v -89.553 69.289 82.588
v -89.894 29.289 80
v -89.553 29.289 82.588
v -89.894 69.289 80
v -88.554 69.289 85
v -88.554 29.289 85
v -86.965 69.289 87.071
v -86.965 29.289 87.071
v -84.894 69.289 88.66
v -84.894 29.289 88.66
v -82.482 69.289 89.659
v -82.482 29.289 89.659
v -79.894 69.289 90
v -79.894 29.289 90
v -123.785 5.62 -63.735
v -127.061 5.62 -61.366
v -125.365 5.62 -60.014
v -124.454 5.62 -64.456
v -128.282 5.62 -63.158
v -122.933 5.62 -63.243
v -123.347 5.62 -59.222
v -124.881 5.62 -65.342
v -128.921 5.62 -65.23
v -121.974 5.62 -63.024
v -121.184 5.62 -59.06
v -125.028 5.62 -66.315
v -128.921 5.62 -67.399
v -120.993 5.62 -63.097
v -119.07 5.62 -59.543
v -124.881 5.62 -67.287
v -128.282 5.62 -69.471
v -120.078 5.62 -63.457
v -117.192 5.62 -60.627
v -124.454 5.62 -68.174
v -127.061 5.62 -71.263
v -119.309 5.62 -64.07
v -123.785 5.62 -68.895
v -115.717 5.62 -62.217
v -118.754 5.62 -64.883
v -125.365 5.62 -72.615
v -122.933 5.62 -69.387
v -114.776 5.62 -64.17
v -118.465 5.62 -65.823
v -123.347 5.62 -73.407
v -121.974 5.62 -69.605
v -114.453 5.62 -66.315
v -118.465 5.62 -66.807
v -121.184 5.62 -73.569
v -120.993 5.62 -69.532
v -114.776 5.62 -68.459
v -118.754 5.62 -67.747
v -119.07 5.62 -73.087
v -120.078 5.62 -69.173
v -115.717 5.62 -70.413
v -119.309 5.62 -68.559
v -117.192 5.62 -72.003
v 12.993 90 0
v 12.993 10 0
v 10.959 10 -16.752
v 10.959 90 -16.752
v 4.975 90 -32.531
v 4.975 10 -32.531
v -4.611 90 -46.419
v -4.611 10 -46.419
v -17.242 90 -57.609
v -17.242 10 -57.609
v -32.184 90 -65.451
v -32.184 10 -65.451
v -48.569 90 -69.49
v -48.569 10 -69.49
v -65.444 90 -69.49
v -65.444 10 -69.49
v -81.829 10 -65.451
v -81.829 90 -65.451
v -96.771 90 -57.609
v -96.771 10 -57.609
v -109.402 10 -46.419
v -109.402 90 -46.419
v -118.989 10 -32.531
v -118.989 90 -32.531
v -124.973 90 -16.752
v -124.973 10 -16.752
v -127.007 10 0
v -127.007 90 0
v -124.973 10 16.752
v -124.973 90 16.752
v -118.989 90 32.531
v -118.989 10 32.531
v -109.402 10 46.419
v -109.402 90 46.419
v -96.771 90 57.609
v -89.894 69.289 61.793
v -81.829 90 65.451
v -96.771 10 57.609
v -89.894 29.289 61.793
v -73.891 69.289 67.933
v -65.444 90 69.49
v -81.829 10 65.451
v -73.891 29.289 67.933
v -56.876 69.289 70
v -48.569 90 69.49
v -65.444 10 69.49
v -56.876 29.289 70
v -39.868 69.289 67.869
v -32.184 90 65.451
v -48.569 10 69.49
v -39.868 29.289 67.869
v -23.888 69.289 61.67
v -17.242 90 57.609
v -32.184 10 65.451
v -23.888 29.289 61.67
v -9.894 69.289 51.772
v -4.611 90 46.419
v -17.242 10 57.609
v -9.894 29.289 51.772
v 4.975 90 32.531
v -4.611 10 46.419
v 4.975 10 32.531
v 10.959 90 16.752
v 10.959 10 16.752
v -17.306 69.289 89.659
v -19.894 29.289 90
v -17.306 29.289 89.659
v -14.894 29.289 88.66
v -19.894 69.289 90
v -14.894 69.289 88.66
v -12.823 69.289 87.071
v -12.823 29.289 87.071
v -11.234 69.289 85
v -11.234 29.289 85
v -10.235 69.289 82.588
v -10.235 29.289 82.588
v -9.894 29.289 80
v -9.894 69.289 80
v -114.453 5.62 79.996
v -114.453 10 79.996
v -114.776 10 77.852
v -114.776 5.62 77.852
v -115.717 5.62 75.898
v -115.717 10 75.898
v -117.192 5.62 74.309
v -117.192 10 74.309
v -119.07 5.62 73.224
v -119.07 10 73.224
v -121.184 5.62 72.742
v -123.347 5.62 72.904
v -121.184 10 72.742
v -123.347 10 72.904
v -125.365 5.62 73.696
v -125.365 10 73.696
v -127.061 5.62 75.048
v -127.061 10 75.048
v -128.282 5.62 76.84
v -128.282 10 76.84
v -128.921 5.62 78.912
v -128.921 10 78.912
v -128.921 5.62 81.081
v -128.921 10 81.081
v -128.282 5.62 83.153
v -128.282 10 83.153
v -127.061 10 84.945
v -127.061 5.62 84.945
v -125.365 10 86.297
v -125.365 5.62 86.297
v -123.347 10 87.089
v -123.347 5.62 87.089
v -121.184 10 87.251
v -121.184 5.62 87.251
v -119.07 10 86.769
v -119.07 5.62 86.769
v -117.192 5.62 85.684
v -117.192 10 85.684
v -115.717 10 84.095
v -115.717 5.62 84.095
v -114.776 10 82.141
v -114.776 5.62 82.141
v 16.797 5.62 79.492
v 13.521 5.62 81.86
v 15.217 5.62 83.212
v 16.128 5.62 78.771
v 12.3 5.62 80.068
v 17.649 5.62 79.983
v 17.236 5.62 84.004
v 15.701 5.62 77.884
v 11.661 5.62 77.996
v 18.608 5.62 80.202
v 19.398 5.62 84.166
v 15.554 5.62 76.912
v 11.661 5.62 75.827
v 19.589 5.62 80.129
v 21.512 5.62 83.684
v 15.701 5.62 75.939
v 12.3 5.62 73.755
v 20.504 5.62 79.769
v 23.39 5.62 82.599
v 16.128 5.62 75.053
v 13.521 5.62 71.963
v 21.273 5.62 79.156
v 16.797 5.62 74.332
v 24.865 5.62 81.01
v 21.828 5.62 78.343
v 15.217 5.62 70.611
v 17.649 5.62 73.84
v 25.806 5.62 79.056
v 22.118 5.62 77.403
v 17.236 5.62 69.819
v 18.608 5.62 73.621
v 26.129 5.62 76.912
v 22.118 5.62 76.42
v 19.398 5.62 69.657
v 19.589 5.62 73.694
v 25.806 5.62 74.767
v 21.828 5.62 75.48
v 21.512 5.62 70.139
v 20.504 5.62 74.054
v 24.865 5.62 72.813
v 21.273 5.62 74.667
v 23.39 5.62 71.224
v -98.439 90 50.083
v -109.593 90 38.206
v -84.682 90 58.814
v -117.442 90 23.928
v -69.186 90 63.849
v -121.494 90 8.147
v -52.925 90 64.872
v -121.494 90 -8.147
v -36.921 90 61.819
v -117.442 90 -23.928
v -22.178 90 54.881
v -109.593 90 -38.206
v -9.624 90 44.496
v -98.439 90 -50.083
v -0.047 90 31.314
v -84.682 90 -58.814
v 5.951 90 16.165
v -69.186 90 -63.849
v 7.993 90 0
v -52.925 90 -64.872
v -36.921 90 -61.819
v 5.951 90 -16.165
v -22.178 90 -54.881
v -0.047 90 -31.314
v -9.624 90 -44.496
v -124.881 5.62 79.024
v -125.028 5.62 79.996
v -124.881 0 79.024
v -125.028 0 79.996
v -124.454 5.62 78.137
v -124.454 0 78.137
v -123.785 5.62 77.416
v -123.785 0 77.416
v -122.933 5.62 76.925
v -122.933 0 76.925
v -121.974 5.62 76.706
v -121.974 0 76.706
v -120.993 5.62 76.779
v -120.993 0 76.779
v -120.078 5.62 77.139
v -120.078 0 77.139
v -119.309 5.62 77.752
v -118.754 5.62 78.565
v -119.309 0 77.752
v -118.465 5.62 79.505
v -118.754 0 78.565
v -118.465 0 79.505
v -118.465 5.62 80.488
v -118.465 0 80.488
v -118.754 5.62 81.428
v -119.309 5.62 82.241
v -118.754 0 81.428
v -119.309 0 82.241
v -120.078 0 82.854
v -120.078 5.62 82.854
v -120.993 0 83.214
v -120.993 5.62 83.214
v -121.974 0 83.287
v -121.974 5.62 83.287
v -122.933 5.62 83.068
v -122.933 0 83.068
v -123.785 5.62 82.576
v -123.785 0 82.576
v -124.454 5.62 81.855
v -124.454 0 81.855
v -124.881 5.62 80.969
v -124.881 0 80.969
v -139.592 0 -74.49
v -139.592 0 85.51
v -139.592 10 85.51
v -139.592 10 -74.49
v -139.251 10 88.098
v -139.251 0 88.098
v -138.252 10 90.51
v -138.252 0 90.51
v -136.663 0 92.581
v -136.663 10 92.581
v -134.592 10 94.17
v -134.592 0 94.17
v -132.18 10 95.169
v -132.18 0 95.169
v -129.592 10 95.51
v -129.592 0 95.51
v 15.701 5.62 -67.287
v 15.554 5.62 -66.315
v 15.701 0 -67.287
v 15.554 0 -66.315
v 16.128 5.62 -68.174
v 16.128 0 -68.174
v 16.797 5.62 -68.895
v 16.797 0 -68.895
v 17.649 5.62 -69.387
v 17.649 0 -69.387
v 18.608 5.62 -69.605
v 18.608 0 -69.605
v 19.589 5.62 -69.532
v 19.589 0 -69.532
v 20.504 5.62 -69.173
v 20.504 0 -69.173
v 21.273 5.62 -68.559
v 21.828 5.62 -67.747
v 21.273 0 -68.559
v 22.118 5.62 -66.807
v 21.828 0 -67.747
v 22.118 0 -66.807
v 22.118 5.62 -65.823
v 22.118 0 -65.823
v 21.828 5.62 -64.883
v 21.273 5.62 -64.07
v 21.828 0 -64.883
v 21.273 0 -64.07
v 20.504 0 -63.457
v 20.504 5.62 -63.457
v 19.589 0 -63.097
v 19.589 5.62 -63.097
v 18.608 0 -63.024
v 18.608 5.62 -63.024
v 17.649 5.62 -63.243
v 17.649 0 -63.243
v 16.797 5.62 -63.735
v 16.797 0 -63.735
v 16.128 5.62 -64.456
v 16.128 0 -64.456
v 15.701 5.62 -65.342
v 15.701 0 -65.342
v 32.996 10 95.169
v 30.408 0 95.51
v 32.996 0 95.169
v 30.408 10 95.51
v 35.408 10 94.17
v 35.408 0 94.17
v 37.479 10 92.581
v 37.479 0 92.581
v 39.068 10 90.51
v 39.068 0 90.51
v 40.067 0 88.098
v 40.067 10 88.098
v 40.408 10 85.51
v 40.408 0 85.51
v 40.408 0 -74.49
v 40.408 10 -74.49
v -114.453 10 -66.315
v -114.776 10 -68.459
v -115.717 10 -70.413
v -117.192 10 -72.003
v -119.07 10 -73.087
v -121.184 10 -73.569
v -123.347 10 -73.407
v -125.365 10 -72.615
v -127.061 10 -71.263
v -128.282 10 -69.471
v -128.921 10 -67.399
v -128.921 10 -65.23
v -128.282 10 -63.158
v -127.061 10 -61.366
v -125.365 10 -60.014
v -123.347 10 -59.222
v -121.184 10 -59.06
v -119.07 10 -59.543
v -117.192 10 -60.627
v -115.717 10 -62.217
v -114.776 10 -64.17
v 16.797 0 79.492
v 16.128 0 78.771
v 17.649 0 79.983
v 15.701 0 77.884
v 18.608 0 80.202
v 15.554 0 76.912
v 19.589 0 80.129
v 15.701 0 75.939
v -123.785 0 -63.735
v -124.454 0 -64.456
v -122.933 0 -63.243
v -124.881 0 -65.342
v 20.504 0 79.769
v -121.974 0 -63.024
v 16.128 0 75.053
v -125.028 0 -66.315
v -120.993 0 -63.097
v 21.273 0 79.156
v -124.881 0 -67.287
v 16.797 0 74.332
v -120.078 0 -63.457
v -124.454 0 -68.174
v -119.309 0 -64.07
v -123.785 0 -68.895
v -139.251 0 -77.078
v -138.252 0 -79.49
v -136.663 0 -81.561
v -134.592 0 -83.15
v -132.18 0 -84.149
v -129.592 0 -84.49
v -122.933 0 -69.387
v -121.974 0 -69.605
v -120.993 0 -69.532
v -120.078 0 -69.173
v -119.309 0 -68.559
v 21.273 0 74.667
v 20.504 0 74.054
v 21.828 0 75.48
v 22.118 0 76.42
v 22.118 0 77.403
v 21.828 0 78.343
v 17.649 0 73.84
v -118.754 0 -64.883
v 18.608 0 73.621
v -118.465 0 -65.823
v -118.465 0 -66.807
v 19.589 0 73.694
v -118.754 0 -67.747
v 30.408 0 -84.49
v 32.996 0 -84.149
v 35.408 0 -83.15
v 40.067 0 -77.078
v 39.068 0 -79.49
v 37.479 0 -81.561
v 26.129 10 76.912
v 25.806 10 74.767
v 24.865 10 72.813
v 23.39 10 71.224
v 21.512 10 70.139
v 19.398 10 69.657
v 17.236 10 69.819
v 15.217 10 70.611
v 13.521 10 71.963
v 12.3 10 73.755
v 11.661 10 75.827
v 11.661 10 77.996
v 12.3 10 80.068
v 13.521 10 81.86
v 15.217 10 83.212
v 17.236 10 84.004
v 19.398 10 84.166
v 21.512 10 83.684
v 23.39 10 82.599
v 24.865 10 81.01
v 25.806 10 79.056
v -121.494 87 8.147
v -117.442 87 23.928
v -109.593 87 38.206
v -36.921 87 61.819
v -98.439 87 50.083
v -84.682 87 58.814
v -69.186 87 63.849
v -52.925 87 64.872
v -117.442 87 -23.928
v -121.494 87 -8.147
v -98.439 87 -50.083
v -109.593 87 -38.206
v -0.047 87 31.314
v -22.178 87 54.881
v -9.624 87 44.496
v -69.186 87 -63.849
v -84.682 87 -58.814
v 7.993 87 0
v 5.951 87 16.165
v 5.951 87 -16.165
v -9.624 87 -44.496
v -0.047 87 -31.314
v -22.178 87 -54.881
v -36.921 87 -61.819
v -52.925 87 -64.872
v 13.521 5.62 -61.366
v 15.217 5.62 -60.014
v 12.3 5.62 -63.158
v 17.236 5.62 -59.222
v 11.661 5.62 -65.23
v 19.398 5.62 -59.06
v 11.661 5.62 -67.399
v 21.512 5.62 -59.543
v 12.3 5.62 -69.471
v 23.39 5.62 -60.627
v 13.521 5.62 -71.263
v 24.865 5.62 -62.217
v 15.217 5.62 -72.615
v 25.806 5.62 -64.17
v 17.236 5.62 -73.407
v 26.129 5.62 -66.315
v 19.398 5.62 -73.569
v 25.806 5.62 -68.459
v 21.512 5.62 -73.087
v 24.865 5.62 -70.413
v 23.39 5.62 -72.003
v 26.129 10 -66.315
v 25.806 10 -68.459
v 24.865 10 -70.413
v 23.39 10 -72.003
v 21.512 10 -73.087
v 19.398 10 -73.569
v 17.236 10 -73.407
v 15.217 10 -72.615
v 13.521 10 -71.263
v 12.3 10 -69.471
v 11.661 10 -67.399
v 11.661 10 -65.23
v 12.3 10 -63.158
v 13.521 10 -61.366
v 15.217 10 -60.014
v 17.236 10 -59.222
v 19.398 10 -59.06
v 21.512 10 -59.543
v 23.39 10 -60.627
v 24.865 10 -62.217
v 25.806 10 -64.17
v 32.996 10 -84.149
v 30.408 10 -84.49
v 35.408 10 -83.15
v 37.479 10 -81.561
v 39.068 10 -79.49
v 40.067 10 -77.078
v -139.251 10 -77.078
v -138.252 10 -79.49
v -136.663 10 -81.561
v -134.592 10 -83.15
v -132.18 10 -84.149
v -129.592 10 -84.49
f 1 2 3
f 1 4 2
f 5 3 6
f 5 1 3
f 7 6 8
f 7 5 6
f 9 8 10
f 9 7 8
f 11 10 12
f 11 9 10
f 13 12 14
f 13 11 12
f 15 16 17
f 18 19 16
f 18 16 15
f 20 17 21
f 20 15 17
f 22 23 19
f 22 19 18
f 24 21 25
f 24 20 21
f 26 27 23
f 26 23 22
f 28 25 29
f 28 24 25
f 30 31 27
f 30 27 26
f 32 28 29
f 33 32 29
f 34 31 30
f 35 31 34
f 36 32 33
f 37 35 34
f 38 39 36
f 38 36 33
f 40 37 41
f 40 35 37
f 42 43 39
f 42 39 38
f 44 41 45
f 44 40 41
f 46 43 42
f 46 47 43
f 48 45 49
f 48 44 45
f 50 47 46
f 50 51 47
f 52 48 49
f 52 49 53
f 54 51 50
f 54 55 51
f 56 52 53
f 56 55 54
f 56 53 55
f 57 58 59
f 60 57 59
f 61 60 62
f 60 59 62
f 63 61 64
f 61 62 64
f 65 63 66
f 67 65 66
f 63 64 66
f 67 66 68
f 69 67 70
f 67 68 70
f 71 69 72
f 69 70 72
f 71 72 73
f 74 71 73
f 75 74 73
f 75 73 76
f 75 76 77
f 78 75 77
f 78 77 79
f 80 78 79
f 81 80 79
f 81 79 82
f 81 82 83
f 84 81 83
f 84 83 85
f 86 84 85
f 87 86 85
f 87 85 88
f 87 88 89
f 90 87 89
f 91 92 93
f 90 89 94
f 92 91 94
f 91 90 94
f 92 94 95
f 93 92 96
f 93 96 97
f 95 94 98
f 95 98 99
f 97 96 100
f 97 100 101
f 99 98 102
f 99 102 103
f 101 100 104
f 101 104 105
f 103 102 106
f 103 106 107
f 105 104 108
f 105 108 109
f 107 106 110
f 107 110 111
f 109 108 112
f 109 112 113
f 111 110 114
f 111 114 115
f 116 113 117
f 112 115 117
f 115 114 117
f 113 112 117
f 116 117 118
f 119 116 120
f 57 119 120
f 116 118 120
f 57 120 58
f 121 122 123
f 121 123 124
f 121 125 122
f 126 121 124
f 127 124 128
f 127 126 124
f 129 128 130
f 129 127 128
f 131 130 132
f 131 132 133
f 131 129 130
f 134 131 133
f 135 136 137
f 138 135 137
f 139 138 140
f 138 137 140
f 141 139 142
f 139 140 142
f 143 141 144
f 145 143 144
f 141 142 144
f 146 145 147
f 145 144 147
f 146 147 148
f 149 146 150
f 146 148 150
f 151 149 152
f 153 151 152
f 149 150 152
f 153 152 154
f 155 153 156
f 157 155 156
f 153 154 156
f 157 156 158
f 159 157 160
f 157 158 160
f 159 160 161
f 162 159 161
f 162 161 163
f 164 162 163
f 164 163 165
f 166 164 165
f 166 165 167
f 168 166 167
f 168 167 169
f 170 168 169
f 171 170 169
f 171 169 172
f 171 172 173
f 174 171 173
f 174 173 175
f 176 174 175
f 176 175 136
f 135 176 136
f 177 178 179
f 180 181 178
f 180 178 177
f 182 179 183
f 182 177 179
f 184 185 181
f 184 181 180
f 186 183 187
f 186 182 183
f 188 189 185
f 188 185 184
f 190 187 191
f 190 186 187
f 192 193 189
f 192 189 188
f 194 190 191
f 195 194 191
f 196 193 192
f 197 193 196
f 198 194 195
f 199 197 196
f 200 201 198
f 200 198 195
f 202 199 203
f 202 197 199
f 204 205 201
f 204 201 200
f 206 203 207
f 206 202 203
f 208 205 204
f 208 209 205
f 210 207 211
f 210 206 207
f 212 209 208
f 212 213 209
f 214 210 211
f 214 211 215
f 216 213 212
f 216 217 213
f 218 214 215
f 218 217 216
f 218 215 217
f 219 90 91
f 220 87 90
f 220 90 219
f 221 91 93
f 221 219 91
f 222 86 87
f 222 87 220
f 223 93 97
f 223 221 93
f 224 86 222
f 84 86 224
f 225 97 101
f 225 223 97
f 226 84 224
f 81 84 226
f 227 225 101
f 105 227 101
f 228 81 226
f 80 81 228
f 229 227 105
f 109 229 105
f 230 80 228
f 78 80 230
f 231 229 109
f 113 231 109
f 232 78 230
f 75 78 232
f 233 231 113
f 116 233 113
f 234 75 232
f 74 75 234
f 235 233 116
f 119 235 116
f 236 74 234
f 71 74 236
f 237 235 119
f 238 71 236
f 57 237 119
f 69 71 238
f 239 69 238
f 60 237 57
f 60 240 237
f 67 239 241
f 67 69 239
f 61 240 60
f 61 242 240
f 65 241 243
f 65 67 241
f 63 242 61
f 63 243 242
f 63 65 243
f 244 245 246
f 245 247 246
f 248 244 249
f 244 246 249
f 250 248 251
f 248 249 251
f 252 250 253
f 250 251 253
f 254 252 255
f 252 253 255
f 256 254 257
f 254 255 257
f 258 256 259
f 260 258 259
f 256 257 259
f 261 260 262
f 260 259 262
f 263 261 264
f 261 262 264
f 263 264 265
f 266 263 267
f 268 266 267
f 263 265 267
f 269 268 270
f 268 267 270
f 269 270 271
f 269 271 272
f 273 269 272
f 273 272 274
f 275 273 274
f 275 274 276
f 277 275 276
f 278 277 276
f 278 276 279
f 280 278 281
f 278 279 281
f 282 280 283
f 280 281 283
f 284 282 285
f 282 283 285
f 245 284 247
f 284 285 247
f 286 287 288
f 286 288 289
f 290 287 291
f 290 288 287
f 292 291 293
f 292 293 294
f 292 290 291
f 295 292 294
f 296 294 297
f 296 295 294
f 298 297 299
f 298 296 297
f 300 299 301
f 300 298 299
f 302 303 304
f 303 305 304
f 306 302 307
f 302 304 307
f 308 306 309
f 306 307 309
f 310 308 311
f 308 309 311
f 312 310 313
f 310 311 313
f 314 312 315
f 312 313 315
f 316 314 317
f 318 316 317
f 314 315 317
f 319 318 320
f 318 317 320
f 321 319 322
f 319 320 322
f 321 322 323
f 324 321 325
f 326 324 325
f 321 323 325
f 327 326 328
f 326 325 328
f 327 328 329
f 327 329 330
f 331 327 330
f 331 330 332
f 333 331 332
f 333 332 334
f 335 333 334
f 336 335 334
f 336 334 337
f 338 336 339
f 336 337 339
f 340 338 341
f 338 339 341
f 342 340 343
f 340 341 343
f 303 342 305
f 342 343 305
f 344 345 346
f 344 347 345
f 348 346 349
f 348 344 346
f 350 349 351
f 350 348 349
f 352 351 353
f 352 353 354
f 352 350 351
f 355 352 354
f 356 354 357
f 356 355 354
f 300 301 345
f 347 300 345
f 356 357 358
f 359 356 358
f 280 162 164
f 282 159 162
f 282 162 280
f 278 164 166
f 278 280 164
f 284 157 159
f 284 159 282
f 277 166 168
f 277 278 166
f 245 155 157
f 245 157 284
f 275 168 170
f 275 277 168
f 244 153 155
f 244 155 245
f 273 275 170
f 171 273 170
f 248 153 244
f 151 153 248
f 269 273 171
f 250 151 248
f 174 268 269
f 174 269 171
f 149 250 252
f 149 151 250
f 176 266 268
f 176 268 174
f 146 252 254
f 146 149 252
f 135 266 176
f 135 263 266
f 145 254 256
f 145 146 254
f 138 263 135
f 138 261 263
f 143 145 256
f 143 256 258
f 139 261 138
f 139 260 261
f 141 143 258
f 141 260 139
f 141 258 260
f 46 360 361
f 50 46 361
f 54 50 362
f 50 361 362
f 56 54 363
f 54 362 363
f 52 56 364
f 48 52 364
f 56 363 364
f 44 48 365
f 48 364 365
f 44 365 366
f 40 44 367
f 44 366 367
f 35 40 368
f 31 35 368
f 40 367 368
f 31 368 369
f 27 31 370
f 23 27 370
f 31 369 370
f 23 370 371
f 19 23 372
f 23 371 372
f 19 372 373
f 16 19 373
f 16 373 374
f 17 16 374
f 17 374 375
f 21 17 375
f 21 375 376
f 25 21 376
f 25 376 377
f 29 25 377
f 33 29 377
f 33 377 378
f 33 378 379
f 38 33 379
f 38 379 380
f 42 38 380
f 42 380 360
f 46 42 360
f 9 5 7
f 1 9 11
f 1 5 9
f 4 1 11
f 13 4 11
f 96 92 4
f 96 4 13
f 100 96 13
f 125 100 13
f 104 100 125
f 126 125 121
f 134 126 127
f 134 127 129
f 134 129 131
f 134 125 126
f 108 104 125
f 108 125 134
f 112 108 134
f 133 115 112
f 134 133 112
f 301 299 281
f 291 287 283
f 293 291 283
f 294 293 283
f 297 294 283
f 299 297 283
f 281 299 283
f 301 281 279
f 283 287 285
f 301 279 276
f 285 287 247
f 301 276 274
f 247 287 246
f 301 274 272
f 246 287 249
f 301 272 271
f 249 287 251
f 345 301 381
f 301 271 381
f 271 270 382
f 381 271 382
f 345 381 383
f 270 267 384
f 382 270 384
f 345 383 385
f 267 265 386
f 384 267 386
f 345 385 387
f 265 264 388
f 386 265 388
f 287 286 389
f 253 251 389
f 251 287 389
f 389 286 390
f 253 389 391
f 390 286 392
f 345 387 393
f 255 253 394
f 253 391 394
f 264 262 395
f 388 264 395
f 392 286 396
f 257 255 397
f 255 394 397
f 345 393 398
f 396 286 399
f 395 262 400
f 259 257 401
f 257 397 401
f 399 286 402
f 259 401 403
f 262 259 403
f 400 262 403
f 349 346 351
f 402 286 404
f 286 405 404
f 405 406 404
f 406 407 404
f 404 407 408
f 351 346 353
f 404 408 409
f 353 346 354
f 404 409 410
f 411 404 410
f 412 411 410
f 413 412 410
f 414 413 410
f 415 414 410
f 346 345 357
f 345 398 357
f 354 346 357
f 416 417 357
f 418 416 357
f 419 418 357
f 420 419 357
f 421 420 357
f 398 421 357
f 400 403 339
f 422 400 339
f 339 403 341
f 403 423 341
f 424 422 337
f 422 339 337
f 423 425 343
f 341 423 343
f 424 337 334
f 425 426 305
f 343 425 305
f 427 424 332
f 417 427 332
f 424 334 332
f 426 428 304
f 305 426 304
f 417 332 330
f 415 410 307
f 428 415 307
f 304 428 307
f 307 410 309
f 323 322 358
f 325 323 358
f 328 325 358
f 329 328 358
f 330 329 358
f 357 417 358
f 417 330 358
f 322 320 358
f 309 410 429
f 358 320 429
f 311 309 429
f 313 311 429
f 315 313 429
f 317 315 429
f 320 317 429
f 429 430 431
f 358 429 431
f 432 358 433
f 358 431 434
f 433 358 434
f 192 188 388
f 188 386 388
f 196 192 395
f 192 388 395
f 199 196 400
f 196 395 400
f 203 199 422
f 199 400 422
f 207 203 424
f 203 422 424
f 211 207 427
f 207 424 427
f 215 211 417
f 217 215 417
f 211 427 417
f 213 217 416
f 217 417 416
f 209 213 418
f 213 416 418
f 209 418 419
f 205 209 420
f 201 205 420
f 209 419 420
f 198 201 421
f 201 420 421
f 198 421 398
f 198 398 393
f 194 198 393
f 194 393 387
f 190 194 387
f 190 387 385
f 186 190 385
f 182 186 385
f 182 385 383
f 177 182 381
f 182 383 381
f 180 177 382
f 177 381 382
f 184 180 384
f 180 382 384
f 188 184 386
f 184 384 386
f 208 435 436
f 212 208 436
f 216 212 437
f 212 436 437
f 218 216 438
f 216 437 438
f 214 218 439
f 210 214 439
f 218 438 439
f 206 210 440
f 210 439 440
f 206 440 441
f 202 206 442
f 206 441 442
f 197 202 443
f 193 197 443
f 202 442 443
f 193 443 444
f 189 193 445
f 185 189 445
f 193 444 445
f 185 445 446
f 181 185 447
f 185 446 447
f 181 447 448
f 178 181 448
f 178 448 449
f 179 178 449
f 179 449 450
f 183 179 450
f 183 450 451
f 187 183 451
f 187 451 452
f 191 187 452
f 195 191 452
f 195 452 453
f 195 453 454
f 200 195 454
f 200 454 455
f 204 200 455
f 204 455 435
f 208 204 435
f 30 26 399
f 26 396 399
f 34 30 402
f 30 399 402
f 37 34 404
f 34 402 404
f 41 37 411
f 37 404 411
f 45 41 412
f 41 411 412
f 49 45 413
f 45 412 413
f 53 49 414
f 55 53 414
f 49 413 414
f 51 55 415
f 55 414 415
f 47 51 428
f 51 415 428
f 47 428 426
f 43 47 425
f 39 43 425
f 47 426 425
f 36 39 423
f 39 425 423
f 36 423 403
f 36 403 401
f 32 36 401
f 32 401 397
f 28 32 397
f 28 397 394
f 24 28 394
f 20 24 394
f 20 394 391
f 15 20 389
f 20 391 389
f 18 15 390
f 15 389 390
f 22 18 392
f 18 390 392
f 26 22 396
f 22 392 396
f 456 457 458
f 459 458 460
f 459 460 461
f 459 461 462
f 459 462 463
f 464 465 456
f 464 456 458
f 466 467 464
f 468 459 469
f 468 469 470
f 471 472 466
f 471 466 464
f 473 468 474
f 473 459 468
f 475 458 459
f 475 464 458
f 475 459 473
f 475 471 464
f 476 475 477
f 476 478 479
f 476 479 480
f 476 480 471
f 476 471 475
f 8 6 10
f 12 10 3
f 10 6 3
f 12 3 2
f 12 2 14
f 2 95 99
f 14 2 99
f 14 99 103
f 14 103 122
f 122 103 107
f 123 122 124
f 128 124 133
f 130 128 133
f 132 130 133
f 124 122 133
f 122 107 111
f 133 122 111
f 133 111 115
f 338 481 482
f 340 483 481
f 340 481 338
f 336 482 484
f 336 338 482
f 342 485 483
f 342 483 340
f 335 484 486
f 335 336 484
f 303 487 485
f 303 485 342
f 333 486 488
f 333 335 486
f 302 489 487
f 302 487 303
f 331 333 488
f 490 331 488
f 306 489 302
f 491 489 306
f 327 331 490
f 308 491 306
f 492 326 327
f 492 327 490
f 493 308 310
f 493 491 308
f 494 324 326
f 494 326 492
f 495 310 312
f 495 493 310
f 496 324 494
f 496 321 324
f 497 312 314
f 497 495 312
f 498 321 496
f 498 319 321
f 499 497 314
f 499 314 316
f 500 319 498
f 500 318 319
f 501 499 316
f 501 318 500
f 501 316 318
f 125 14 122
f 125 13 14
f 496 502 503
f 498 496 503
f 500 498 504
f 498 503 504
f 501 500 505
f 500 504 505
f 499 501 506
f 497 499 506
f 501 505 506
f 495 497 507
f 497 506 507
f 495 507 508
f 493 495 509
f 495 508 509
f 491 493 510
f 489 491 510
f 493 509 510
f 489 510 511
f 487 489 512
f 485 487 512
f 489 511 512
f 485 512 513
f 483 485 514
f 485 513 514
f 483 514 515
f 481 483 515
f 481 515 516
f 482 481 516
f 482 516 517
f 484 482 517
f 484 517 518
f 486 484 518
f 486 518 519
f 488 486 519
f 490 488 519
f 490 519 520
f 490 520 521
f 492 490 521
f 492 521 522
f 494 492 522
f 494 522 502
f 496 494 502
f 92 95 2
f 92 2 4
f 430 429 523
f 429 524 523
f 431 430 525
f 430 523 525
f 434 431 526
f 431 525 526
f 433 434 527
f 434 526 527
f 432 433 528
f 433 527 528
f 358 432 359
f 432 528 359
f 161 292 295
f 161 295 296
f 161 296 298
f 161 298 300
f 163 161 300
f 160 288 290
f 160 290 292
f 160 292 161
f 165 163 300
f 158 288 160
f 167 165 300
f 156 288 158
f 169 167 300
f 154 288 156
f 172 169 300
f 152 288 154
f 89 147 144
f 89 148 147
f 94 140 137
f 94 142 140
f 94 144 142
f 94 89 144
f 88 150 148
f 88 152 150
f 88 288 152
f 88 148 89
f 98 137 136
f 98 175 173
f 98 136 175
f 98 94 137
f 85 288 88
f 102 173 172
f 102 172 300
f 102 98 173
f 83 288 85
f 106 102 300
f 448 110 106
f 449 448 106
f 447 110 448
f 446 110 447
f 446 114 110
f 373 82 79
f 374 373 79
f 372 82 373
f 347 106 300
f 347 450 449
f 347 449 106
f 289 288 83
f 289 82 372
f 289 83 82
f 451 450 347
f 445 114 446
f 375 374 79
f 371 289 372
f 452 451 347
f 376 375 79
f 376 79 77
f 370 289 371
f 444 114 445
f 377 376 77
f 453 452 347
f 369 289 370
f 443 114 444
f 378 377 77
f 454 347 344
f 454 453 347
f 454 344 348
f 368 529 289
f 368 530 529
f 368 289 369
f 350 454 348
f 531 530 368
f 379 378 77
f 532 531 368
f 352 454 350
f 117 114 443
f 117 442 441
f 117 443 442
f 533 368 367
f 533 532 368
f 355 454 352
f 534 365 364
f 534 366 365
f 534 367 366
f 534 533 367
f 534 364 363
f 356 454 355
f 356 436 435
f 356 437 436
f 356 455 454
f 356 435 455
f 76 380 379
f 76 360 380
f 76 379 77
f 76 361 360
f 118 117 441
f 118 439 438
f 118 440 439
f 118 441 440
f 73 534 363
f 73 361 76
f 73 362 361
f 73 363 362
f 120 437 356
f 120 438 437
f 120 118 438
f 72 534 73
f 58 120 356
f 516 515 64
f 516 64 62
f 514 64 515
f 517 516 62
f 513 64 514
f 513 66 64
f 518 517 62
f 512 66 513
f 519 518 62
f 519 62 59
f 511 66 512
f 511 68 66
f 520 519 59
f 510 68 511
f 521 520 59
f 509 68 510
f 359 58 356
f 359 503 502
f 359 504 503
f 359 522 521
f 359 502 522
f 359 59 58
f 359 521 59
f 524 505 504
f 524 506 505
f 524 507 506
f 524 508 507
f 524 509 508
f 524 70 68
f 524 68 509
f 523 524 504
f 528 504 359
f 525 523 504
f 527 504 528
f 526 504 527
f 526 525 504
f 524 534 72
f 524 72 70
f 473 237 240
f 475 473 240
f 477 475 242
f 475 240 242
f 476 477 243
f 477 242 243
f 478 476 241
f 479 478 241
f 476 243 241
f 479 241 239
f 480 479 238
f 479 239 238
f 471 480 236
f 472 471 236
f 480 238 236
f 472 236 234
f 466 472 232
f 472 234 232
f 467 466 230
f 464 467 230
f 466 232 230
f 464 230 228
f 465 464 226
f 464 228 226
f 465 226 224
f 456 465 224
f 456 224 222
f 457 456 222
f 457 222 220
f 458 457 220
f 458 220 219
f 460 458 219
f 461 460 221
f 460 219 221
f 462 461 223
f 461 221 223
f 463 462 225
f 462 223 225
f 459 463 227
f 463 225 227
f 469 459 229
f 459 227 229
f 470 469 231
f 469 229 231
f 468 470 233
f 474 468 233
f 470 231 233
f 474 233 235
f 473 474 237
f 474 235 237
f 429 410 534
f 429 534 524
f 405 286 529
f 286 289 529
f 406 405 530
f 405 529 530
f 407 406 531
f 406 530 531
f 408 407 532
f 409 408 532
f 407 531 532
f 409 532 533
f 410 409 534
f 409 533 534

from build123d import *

# Parameters (mm, degrees)
SKETCH1_W                               = 180
SKETCH1_H                               = 180
BOSS_EXTRUDE1_DEPTH                     = 10
SKETCH2_R                               = 70
BOSS_EXTRUDE2_DEPTH                     = 80
SKETCH3_W                               = 80
SKETCH3_H                               = 40
BOSS_EXTRUDE3_DEPTH                     = 90
SKETCH4_R                               = 65
CUT_EXTRUDE1_DEPTH                      = 3
CBORE_FOR_M6_HEX_HEAD_BOLT1_D           = 6.6
CBORE_FOR_M6_HEX_HEAD_BOLT1_CBORE_D     = 14.55
CBORE_FOR_M6_HEX_HEAD_BOLT1_CBORE_DEPTH = 4.38
FILLET1_R                               = 10


with BuildPart() as part:
    # Sketch1 → Boss-Extrude1 (new body)
    with BuildSketch(Plane(origin=(0, 0, 0), x_dir=(1, 0, 0), z_dir=(0, 1, 0))):
        with Locations((-49.591836735, -5.510204082)):
            Rectangle(SKETCH1_W, SKETCH1_H)
    extrude(amount=BOSS_EXTRUDE1_DEPTH)

    # Sketch2 → Boss-Extrude2 (add)
    with BuildSketch(Plane(origin=(0, 10, 0), x_dir=(1, 0, 0), z_dir=(0, 1, 0))):
        with Locations((-57.006666854, 0)):
            Circle(SKETCH2_R)
    extrude(amount=BOSS_EXTRUDE2_DEPTH)

    # Sketch3 → Boss-Extrude3 (add)
    with BuildSketch(Plane.XY):
        with Locations((-49.893940427, 49.288531055)):
            Rectangle(SKETCH3_W, SKETCH3_H)
    extrude(amount=BOSS_EXTRUDE3_DEPTH)

    # Sketch4 → Cut-Extrude1 (cut)
    with BuildSketch(Plane(origin=(0, 90, 0), x_dir=(1, 0, 0), z_dir=(0, 1, 0))):
        with Locations((-57.006666854, 0)):
            Circle(SKETCH4_R)
    extrude(amount=-CUT_EXTRUDE1_DEPTH, mode=Mode.SUBTRACT)

    # CBORE for M6 Hex Head Bolt1 (through all)
    with Locations(Plane(origin=(0, 10, 0), x_dir=(1, 0, 0), z_dir=(0, 1, 0))):
        with Locations((-121.727687168, 66.314718067), (18.854420034, 66.314718067), (18.854420034, -76.9115667), (-121.727687168, -79.996440525)):
            CounterBoreHole(CBORE_FOR_M6_HEX_HEAD_BOLT1_D / 2, CBORE_FOR_M6_HEX_HEAD_BOLT1_CBORE_D / 2, CBORE_FOR_M6_HEX_HEAD_BOLT1_CBORE_DEPTH)

    # Fillet1
    fillet1_edges = [part.edges().sort_by_distance(p)[0] for p in [
        (-89.893940427, 49.288531055, 90),
        (-9.893940427, 49.288531055, 90),
        (-139.591836735, 5, -84.489795918),
        (40.408163265, 5, -84.489795918),
        (40.408163265, 5, 95.510204082),
        (-139.591836735, 5, 95.510204082),
    ]]
    fillet(fillet1_edges, radius=FILLET1_R)


solid = part.part
